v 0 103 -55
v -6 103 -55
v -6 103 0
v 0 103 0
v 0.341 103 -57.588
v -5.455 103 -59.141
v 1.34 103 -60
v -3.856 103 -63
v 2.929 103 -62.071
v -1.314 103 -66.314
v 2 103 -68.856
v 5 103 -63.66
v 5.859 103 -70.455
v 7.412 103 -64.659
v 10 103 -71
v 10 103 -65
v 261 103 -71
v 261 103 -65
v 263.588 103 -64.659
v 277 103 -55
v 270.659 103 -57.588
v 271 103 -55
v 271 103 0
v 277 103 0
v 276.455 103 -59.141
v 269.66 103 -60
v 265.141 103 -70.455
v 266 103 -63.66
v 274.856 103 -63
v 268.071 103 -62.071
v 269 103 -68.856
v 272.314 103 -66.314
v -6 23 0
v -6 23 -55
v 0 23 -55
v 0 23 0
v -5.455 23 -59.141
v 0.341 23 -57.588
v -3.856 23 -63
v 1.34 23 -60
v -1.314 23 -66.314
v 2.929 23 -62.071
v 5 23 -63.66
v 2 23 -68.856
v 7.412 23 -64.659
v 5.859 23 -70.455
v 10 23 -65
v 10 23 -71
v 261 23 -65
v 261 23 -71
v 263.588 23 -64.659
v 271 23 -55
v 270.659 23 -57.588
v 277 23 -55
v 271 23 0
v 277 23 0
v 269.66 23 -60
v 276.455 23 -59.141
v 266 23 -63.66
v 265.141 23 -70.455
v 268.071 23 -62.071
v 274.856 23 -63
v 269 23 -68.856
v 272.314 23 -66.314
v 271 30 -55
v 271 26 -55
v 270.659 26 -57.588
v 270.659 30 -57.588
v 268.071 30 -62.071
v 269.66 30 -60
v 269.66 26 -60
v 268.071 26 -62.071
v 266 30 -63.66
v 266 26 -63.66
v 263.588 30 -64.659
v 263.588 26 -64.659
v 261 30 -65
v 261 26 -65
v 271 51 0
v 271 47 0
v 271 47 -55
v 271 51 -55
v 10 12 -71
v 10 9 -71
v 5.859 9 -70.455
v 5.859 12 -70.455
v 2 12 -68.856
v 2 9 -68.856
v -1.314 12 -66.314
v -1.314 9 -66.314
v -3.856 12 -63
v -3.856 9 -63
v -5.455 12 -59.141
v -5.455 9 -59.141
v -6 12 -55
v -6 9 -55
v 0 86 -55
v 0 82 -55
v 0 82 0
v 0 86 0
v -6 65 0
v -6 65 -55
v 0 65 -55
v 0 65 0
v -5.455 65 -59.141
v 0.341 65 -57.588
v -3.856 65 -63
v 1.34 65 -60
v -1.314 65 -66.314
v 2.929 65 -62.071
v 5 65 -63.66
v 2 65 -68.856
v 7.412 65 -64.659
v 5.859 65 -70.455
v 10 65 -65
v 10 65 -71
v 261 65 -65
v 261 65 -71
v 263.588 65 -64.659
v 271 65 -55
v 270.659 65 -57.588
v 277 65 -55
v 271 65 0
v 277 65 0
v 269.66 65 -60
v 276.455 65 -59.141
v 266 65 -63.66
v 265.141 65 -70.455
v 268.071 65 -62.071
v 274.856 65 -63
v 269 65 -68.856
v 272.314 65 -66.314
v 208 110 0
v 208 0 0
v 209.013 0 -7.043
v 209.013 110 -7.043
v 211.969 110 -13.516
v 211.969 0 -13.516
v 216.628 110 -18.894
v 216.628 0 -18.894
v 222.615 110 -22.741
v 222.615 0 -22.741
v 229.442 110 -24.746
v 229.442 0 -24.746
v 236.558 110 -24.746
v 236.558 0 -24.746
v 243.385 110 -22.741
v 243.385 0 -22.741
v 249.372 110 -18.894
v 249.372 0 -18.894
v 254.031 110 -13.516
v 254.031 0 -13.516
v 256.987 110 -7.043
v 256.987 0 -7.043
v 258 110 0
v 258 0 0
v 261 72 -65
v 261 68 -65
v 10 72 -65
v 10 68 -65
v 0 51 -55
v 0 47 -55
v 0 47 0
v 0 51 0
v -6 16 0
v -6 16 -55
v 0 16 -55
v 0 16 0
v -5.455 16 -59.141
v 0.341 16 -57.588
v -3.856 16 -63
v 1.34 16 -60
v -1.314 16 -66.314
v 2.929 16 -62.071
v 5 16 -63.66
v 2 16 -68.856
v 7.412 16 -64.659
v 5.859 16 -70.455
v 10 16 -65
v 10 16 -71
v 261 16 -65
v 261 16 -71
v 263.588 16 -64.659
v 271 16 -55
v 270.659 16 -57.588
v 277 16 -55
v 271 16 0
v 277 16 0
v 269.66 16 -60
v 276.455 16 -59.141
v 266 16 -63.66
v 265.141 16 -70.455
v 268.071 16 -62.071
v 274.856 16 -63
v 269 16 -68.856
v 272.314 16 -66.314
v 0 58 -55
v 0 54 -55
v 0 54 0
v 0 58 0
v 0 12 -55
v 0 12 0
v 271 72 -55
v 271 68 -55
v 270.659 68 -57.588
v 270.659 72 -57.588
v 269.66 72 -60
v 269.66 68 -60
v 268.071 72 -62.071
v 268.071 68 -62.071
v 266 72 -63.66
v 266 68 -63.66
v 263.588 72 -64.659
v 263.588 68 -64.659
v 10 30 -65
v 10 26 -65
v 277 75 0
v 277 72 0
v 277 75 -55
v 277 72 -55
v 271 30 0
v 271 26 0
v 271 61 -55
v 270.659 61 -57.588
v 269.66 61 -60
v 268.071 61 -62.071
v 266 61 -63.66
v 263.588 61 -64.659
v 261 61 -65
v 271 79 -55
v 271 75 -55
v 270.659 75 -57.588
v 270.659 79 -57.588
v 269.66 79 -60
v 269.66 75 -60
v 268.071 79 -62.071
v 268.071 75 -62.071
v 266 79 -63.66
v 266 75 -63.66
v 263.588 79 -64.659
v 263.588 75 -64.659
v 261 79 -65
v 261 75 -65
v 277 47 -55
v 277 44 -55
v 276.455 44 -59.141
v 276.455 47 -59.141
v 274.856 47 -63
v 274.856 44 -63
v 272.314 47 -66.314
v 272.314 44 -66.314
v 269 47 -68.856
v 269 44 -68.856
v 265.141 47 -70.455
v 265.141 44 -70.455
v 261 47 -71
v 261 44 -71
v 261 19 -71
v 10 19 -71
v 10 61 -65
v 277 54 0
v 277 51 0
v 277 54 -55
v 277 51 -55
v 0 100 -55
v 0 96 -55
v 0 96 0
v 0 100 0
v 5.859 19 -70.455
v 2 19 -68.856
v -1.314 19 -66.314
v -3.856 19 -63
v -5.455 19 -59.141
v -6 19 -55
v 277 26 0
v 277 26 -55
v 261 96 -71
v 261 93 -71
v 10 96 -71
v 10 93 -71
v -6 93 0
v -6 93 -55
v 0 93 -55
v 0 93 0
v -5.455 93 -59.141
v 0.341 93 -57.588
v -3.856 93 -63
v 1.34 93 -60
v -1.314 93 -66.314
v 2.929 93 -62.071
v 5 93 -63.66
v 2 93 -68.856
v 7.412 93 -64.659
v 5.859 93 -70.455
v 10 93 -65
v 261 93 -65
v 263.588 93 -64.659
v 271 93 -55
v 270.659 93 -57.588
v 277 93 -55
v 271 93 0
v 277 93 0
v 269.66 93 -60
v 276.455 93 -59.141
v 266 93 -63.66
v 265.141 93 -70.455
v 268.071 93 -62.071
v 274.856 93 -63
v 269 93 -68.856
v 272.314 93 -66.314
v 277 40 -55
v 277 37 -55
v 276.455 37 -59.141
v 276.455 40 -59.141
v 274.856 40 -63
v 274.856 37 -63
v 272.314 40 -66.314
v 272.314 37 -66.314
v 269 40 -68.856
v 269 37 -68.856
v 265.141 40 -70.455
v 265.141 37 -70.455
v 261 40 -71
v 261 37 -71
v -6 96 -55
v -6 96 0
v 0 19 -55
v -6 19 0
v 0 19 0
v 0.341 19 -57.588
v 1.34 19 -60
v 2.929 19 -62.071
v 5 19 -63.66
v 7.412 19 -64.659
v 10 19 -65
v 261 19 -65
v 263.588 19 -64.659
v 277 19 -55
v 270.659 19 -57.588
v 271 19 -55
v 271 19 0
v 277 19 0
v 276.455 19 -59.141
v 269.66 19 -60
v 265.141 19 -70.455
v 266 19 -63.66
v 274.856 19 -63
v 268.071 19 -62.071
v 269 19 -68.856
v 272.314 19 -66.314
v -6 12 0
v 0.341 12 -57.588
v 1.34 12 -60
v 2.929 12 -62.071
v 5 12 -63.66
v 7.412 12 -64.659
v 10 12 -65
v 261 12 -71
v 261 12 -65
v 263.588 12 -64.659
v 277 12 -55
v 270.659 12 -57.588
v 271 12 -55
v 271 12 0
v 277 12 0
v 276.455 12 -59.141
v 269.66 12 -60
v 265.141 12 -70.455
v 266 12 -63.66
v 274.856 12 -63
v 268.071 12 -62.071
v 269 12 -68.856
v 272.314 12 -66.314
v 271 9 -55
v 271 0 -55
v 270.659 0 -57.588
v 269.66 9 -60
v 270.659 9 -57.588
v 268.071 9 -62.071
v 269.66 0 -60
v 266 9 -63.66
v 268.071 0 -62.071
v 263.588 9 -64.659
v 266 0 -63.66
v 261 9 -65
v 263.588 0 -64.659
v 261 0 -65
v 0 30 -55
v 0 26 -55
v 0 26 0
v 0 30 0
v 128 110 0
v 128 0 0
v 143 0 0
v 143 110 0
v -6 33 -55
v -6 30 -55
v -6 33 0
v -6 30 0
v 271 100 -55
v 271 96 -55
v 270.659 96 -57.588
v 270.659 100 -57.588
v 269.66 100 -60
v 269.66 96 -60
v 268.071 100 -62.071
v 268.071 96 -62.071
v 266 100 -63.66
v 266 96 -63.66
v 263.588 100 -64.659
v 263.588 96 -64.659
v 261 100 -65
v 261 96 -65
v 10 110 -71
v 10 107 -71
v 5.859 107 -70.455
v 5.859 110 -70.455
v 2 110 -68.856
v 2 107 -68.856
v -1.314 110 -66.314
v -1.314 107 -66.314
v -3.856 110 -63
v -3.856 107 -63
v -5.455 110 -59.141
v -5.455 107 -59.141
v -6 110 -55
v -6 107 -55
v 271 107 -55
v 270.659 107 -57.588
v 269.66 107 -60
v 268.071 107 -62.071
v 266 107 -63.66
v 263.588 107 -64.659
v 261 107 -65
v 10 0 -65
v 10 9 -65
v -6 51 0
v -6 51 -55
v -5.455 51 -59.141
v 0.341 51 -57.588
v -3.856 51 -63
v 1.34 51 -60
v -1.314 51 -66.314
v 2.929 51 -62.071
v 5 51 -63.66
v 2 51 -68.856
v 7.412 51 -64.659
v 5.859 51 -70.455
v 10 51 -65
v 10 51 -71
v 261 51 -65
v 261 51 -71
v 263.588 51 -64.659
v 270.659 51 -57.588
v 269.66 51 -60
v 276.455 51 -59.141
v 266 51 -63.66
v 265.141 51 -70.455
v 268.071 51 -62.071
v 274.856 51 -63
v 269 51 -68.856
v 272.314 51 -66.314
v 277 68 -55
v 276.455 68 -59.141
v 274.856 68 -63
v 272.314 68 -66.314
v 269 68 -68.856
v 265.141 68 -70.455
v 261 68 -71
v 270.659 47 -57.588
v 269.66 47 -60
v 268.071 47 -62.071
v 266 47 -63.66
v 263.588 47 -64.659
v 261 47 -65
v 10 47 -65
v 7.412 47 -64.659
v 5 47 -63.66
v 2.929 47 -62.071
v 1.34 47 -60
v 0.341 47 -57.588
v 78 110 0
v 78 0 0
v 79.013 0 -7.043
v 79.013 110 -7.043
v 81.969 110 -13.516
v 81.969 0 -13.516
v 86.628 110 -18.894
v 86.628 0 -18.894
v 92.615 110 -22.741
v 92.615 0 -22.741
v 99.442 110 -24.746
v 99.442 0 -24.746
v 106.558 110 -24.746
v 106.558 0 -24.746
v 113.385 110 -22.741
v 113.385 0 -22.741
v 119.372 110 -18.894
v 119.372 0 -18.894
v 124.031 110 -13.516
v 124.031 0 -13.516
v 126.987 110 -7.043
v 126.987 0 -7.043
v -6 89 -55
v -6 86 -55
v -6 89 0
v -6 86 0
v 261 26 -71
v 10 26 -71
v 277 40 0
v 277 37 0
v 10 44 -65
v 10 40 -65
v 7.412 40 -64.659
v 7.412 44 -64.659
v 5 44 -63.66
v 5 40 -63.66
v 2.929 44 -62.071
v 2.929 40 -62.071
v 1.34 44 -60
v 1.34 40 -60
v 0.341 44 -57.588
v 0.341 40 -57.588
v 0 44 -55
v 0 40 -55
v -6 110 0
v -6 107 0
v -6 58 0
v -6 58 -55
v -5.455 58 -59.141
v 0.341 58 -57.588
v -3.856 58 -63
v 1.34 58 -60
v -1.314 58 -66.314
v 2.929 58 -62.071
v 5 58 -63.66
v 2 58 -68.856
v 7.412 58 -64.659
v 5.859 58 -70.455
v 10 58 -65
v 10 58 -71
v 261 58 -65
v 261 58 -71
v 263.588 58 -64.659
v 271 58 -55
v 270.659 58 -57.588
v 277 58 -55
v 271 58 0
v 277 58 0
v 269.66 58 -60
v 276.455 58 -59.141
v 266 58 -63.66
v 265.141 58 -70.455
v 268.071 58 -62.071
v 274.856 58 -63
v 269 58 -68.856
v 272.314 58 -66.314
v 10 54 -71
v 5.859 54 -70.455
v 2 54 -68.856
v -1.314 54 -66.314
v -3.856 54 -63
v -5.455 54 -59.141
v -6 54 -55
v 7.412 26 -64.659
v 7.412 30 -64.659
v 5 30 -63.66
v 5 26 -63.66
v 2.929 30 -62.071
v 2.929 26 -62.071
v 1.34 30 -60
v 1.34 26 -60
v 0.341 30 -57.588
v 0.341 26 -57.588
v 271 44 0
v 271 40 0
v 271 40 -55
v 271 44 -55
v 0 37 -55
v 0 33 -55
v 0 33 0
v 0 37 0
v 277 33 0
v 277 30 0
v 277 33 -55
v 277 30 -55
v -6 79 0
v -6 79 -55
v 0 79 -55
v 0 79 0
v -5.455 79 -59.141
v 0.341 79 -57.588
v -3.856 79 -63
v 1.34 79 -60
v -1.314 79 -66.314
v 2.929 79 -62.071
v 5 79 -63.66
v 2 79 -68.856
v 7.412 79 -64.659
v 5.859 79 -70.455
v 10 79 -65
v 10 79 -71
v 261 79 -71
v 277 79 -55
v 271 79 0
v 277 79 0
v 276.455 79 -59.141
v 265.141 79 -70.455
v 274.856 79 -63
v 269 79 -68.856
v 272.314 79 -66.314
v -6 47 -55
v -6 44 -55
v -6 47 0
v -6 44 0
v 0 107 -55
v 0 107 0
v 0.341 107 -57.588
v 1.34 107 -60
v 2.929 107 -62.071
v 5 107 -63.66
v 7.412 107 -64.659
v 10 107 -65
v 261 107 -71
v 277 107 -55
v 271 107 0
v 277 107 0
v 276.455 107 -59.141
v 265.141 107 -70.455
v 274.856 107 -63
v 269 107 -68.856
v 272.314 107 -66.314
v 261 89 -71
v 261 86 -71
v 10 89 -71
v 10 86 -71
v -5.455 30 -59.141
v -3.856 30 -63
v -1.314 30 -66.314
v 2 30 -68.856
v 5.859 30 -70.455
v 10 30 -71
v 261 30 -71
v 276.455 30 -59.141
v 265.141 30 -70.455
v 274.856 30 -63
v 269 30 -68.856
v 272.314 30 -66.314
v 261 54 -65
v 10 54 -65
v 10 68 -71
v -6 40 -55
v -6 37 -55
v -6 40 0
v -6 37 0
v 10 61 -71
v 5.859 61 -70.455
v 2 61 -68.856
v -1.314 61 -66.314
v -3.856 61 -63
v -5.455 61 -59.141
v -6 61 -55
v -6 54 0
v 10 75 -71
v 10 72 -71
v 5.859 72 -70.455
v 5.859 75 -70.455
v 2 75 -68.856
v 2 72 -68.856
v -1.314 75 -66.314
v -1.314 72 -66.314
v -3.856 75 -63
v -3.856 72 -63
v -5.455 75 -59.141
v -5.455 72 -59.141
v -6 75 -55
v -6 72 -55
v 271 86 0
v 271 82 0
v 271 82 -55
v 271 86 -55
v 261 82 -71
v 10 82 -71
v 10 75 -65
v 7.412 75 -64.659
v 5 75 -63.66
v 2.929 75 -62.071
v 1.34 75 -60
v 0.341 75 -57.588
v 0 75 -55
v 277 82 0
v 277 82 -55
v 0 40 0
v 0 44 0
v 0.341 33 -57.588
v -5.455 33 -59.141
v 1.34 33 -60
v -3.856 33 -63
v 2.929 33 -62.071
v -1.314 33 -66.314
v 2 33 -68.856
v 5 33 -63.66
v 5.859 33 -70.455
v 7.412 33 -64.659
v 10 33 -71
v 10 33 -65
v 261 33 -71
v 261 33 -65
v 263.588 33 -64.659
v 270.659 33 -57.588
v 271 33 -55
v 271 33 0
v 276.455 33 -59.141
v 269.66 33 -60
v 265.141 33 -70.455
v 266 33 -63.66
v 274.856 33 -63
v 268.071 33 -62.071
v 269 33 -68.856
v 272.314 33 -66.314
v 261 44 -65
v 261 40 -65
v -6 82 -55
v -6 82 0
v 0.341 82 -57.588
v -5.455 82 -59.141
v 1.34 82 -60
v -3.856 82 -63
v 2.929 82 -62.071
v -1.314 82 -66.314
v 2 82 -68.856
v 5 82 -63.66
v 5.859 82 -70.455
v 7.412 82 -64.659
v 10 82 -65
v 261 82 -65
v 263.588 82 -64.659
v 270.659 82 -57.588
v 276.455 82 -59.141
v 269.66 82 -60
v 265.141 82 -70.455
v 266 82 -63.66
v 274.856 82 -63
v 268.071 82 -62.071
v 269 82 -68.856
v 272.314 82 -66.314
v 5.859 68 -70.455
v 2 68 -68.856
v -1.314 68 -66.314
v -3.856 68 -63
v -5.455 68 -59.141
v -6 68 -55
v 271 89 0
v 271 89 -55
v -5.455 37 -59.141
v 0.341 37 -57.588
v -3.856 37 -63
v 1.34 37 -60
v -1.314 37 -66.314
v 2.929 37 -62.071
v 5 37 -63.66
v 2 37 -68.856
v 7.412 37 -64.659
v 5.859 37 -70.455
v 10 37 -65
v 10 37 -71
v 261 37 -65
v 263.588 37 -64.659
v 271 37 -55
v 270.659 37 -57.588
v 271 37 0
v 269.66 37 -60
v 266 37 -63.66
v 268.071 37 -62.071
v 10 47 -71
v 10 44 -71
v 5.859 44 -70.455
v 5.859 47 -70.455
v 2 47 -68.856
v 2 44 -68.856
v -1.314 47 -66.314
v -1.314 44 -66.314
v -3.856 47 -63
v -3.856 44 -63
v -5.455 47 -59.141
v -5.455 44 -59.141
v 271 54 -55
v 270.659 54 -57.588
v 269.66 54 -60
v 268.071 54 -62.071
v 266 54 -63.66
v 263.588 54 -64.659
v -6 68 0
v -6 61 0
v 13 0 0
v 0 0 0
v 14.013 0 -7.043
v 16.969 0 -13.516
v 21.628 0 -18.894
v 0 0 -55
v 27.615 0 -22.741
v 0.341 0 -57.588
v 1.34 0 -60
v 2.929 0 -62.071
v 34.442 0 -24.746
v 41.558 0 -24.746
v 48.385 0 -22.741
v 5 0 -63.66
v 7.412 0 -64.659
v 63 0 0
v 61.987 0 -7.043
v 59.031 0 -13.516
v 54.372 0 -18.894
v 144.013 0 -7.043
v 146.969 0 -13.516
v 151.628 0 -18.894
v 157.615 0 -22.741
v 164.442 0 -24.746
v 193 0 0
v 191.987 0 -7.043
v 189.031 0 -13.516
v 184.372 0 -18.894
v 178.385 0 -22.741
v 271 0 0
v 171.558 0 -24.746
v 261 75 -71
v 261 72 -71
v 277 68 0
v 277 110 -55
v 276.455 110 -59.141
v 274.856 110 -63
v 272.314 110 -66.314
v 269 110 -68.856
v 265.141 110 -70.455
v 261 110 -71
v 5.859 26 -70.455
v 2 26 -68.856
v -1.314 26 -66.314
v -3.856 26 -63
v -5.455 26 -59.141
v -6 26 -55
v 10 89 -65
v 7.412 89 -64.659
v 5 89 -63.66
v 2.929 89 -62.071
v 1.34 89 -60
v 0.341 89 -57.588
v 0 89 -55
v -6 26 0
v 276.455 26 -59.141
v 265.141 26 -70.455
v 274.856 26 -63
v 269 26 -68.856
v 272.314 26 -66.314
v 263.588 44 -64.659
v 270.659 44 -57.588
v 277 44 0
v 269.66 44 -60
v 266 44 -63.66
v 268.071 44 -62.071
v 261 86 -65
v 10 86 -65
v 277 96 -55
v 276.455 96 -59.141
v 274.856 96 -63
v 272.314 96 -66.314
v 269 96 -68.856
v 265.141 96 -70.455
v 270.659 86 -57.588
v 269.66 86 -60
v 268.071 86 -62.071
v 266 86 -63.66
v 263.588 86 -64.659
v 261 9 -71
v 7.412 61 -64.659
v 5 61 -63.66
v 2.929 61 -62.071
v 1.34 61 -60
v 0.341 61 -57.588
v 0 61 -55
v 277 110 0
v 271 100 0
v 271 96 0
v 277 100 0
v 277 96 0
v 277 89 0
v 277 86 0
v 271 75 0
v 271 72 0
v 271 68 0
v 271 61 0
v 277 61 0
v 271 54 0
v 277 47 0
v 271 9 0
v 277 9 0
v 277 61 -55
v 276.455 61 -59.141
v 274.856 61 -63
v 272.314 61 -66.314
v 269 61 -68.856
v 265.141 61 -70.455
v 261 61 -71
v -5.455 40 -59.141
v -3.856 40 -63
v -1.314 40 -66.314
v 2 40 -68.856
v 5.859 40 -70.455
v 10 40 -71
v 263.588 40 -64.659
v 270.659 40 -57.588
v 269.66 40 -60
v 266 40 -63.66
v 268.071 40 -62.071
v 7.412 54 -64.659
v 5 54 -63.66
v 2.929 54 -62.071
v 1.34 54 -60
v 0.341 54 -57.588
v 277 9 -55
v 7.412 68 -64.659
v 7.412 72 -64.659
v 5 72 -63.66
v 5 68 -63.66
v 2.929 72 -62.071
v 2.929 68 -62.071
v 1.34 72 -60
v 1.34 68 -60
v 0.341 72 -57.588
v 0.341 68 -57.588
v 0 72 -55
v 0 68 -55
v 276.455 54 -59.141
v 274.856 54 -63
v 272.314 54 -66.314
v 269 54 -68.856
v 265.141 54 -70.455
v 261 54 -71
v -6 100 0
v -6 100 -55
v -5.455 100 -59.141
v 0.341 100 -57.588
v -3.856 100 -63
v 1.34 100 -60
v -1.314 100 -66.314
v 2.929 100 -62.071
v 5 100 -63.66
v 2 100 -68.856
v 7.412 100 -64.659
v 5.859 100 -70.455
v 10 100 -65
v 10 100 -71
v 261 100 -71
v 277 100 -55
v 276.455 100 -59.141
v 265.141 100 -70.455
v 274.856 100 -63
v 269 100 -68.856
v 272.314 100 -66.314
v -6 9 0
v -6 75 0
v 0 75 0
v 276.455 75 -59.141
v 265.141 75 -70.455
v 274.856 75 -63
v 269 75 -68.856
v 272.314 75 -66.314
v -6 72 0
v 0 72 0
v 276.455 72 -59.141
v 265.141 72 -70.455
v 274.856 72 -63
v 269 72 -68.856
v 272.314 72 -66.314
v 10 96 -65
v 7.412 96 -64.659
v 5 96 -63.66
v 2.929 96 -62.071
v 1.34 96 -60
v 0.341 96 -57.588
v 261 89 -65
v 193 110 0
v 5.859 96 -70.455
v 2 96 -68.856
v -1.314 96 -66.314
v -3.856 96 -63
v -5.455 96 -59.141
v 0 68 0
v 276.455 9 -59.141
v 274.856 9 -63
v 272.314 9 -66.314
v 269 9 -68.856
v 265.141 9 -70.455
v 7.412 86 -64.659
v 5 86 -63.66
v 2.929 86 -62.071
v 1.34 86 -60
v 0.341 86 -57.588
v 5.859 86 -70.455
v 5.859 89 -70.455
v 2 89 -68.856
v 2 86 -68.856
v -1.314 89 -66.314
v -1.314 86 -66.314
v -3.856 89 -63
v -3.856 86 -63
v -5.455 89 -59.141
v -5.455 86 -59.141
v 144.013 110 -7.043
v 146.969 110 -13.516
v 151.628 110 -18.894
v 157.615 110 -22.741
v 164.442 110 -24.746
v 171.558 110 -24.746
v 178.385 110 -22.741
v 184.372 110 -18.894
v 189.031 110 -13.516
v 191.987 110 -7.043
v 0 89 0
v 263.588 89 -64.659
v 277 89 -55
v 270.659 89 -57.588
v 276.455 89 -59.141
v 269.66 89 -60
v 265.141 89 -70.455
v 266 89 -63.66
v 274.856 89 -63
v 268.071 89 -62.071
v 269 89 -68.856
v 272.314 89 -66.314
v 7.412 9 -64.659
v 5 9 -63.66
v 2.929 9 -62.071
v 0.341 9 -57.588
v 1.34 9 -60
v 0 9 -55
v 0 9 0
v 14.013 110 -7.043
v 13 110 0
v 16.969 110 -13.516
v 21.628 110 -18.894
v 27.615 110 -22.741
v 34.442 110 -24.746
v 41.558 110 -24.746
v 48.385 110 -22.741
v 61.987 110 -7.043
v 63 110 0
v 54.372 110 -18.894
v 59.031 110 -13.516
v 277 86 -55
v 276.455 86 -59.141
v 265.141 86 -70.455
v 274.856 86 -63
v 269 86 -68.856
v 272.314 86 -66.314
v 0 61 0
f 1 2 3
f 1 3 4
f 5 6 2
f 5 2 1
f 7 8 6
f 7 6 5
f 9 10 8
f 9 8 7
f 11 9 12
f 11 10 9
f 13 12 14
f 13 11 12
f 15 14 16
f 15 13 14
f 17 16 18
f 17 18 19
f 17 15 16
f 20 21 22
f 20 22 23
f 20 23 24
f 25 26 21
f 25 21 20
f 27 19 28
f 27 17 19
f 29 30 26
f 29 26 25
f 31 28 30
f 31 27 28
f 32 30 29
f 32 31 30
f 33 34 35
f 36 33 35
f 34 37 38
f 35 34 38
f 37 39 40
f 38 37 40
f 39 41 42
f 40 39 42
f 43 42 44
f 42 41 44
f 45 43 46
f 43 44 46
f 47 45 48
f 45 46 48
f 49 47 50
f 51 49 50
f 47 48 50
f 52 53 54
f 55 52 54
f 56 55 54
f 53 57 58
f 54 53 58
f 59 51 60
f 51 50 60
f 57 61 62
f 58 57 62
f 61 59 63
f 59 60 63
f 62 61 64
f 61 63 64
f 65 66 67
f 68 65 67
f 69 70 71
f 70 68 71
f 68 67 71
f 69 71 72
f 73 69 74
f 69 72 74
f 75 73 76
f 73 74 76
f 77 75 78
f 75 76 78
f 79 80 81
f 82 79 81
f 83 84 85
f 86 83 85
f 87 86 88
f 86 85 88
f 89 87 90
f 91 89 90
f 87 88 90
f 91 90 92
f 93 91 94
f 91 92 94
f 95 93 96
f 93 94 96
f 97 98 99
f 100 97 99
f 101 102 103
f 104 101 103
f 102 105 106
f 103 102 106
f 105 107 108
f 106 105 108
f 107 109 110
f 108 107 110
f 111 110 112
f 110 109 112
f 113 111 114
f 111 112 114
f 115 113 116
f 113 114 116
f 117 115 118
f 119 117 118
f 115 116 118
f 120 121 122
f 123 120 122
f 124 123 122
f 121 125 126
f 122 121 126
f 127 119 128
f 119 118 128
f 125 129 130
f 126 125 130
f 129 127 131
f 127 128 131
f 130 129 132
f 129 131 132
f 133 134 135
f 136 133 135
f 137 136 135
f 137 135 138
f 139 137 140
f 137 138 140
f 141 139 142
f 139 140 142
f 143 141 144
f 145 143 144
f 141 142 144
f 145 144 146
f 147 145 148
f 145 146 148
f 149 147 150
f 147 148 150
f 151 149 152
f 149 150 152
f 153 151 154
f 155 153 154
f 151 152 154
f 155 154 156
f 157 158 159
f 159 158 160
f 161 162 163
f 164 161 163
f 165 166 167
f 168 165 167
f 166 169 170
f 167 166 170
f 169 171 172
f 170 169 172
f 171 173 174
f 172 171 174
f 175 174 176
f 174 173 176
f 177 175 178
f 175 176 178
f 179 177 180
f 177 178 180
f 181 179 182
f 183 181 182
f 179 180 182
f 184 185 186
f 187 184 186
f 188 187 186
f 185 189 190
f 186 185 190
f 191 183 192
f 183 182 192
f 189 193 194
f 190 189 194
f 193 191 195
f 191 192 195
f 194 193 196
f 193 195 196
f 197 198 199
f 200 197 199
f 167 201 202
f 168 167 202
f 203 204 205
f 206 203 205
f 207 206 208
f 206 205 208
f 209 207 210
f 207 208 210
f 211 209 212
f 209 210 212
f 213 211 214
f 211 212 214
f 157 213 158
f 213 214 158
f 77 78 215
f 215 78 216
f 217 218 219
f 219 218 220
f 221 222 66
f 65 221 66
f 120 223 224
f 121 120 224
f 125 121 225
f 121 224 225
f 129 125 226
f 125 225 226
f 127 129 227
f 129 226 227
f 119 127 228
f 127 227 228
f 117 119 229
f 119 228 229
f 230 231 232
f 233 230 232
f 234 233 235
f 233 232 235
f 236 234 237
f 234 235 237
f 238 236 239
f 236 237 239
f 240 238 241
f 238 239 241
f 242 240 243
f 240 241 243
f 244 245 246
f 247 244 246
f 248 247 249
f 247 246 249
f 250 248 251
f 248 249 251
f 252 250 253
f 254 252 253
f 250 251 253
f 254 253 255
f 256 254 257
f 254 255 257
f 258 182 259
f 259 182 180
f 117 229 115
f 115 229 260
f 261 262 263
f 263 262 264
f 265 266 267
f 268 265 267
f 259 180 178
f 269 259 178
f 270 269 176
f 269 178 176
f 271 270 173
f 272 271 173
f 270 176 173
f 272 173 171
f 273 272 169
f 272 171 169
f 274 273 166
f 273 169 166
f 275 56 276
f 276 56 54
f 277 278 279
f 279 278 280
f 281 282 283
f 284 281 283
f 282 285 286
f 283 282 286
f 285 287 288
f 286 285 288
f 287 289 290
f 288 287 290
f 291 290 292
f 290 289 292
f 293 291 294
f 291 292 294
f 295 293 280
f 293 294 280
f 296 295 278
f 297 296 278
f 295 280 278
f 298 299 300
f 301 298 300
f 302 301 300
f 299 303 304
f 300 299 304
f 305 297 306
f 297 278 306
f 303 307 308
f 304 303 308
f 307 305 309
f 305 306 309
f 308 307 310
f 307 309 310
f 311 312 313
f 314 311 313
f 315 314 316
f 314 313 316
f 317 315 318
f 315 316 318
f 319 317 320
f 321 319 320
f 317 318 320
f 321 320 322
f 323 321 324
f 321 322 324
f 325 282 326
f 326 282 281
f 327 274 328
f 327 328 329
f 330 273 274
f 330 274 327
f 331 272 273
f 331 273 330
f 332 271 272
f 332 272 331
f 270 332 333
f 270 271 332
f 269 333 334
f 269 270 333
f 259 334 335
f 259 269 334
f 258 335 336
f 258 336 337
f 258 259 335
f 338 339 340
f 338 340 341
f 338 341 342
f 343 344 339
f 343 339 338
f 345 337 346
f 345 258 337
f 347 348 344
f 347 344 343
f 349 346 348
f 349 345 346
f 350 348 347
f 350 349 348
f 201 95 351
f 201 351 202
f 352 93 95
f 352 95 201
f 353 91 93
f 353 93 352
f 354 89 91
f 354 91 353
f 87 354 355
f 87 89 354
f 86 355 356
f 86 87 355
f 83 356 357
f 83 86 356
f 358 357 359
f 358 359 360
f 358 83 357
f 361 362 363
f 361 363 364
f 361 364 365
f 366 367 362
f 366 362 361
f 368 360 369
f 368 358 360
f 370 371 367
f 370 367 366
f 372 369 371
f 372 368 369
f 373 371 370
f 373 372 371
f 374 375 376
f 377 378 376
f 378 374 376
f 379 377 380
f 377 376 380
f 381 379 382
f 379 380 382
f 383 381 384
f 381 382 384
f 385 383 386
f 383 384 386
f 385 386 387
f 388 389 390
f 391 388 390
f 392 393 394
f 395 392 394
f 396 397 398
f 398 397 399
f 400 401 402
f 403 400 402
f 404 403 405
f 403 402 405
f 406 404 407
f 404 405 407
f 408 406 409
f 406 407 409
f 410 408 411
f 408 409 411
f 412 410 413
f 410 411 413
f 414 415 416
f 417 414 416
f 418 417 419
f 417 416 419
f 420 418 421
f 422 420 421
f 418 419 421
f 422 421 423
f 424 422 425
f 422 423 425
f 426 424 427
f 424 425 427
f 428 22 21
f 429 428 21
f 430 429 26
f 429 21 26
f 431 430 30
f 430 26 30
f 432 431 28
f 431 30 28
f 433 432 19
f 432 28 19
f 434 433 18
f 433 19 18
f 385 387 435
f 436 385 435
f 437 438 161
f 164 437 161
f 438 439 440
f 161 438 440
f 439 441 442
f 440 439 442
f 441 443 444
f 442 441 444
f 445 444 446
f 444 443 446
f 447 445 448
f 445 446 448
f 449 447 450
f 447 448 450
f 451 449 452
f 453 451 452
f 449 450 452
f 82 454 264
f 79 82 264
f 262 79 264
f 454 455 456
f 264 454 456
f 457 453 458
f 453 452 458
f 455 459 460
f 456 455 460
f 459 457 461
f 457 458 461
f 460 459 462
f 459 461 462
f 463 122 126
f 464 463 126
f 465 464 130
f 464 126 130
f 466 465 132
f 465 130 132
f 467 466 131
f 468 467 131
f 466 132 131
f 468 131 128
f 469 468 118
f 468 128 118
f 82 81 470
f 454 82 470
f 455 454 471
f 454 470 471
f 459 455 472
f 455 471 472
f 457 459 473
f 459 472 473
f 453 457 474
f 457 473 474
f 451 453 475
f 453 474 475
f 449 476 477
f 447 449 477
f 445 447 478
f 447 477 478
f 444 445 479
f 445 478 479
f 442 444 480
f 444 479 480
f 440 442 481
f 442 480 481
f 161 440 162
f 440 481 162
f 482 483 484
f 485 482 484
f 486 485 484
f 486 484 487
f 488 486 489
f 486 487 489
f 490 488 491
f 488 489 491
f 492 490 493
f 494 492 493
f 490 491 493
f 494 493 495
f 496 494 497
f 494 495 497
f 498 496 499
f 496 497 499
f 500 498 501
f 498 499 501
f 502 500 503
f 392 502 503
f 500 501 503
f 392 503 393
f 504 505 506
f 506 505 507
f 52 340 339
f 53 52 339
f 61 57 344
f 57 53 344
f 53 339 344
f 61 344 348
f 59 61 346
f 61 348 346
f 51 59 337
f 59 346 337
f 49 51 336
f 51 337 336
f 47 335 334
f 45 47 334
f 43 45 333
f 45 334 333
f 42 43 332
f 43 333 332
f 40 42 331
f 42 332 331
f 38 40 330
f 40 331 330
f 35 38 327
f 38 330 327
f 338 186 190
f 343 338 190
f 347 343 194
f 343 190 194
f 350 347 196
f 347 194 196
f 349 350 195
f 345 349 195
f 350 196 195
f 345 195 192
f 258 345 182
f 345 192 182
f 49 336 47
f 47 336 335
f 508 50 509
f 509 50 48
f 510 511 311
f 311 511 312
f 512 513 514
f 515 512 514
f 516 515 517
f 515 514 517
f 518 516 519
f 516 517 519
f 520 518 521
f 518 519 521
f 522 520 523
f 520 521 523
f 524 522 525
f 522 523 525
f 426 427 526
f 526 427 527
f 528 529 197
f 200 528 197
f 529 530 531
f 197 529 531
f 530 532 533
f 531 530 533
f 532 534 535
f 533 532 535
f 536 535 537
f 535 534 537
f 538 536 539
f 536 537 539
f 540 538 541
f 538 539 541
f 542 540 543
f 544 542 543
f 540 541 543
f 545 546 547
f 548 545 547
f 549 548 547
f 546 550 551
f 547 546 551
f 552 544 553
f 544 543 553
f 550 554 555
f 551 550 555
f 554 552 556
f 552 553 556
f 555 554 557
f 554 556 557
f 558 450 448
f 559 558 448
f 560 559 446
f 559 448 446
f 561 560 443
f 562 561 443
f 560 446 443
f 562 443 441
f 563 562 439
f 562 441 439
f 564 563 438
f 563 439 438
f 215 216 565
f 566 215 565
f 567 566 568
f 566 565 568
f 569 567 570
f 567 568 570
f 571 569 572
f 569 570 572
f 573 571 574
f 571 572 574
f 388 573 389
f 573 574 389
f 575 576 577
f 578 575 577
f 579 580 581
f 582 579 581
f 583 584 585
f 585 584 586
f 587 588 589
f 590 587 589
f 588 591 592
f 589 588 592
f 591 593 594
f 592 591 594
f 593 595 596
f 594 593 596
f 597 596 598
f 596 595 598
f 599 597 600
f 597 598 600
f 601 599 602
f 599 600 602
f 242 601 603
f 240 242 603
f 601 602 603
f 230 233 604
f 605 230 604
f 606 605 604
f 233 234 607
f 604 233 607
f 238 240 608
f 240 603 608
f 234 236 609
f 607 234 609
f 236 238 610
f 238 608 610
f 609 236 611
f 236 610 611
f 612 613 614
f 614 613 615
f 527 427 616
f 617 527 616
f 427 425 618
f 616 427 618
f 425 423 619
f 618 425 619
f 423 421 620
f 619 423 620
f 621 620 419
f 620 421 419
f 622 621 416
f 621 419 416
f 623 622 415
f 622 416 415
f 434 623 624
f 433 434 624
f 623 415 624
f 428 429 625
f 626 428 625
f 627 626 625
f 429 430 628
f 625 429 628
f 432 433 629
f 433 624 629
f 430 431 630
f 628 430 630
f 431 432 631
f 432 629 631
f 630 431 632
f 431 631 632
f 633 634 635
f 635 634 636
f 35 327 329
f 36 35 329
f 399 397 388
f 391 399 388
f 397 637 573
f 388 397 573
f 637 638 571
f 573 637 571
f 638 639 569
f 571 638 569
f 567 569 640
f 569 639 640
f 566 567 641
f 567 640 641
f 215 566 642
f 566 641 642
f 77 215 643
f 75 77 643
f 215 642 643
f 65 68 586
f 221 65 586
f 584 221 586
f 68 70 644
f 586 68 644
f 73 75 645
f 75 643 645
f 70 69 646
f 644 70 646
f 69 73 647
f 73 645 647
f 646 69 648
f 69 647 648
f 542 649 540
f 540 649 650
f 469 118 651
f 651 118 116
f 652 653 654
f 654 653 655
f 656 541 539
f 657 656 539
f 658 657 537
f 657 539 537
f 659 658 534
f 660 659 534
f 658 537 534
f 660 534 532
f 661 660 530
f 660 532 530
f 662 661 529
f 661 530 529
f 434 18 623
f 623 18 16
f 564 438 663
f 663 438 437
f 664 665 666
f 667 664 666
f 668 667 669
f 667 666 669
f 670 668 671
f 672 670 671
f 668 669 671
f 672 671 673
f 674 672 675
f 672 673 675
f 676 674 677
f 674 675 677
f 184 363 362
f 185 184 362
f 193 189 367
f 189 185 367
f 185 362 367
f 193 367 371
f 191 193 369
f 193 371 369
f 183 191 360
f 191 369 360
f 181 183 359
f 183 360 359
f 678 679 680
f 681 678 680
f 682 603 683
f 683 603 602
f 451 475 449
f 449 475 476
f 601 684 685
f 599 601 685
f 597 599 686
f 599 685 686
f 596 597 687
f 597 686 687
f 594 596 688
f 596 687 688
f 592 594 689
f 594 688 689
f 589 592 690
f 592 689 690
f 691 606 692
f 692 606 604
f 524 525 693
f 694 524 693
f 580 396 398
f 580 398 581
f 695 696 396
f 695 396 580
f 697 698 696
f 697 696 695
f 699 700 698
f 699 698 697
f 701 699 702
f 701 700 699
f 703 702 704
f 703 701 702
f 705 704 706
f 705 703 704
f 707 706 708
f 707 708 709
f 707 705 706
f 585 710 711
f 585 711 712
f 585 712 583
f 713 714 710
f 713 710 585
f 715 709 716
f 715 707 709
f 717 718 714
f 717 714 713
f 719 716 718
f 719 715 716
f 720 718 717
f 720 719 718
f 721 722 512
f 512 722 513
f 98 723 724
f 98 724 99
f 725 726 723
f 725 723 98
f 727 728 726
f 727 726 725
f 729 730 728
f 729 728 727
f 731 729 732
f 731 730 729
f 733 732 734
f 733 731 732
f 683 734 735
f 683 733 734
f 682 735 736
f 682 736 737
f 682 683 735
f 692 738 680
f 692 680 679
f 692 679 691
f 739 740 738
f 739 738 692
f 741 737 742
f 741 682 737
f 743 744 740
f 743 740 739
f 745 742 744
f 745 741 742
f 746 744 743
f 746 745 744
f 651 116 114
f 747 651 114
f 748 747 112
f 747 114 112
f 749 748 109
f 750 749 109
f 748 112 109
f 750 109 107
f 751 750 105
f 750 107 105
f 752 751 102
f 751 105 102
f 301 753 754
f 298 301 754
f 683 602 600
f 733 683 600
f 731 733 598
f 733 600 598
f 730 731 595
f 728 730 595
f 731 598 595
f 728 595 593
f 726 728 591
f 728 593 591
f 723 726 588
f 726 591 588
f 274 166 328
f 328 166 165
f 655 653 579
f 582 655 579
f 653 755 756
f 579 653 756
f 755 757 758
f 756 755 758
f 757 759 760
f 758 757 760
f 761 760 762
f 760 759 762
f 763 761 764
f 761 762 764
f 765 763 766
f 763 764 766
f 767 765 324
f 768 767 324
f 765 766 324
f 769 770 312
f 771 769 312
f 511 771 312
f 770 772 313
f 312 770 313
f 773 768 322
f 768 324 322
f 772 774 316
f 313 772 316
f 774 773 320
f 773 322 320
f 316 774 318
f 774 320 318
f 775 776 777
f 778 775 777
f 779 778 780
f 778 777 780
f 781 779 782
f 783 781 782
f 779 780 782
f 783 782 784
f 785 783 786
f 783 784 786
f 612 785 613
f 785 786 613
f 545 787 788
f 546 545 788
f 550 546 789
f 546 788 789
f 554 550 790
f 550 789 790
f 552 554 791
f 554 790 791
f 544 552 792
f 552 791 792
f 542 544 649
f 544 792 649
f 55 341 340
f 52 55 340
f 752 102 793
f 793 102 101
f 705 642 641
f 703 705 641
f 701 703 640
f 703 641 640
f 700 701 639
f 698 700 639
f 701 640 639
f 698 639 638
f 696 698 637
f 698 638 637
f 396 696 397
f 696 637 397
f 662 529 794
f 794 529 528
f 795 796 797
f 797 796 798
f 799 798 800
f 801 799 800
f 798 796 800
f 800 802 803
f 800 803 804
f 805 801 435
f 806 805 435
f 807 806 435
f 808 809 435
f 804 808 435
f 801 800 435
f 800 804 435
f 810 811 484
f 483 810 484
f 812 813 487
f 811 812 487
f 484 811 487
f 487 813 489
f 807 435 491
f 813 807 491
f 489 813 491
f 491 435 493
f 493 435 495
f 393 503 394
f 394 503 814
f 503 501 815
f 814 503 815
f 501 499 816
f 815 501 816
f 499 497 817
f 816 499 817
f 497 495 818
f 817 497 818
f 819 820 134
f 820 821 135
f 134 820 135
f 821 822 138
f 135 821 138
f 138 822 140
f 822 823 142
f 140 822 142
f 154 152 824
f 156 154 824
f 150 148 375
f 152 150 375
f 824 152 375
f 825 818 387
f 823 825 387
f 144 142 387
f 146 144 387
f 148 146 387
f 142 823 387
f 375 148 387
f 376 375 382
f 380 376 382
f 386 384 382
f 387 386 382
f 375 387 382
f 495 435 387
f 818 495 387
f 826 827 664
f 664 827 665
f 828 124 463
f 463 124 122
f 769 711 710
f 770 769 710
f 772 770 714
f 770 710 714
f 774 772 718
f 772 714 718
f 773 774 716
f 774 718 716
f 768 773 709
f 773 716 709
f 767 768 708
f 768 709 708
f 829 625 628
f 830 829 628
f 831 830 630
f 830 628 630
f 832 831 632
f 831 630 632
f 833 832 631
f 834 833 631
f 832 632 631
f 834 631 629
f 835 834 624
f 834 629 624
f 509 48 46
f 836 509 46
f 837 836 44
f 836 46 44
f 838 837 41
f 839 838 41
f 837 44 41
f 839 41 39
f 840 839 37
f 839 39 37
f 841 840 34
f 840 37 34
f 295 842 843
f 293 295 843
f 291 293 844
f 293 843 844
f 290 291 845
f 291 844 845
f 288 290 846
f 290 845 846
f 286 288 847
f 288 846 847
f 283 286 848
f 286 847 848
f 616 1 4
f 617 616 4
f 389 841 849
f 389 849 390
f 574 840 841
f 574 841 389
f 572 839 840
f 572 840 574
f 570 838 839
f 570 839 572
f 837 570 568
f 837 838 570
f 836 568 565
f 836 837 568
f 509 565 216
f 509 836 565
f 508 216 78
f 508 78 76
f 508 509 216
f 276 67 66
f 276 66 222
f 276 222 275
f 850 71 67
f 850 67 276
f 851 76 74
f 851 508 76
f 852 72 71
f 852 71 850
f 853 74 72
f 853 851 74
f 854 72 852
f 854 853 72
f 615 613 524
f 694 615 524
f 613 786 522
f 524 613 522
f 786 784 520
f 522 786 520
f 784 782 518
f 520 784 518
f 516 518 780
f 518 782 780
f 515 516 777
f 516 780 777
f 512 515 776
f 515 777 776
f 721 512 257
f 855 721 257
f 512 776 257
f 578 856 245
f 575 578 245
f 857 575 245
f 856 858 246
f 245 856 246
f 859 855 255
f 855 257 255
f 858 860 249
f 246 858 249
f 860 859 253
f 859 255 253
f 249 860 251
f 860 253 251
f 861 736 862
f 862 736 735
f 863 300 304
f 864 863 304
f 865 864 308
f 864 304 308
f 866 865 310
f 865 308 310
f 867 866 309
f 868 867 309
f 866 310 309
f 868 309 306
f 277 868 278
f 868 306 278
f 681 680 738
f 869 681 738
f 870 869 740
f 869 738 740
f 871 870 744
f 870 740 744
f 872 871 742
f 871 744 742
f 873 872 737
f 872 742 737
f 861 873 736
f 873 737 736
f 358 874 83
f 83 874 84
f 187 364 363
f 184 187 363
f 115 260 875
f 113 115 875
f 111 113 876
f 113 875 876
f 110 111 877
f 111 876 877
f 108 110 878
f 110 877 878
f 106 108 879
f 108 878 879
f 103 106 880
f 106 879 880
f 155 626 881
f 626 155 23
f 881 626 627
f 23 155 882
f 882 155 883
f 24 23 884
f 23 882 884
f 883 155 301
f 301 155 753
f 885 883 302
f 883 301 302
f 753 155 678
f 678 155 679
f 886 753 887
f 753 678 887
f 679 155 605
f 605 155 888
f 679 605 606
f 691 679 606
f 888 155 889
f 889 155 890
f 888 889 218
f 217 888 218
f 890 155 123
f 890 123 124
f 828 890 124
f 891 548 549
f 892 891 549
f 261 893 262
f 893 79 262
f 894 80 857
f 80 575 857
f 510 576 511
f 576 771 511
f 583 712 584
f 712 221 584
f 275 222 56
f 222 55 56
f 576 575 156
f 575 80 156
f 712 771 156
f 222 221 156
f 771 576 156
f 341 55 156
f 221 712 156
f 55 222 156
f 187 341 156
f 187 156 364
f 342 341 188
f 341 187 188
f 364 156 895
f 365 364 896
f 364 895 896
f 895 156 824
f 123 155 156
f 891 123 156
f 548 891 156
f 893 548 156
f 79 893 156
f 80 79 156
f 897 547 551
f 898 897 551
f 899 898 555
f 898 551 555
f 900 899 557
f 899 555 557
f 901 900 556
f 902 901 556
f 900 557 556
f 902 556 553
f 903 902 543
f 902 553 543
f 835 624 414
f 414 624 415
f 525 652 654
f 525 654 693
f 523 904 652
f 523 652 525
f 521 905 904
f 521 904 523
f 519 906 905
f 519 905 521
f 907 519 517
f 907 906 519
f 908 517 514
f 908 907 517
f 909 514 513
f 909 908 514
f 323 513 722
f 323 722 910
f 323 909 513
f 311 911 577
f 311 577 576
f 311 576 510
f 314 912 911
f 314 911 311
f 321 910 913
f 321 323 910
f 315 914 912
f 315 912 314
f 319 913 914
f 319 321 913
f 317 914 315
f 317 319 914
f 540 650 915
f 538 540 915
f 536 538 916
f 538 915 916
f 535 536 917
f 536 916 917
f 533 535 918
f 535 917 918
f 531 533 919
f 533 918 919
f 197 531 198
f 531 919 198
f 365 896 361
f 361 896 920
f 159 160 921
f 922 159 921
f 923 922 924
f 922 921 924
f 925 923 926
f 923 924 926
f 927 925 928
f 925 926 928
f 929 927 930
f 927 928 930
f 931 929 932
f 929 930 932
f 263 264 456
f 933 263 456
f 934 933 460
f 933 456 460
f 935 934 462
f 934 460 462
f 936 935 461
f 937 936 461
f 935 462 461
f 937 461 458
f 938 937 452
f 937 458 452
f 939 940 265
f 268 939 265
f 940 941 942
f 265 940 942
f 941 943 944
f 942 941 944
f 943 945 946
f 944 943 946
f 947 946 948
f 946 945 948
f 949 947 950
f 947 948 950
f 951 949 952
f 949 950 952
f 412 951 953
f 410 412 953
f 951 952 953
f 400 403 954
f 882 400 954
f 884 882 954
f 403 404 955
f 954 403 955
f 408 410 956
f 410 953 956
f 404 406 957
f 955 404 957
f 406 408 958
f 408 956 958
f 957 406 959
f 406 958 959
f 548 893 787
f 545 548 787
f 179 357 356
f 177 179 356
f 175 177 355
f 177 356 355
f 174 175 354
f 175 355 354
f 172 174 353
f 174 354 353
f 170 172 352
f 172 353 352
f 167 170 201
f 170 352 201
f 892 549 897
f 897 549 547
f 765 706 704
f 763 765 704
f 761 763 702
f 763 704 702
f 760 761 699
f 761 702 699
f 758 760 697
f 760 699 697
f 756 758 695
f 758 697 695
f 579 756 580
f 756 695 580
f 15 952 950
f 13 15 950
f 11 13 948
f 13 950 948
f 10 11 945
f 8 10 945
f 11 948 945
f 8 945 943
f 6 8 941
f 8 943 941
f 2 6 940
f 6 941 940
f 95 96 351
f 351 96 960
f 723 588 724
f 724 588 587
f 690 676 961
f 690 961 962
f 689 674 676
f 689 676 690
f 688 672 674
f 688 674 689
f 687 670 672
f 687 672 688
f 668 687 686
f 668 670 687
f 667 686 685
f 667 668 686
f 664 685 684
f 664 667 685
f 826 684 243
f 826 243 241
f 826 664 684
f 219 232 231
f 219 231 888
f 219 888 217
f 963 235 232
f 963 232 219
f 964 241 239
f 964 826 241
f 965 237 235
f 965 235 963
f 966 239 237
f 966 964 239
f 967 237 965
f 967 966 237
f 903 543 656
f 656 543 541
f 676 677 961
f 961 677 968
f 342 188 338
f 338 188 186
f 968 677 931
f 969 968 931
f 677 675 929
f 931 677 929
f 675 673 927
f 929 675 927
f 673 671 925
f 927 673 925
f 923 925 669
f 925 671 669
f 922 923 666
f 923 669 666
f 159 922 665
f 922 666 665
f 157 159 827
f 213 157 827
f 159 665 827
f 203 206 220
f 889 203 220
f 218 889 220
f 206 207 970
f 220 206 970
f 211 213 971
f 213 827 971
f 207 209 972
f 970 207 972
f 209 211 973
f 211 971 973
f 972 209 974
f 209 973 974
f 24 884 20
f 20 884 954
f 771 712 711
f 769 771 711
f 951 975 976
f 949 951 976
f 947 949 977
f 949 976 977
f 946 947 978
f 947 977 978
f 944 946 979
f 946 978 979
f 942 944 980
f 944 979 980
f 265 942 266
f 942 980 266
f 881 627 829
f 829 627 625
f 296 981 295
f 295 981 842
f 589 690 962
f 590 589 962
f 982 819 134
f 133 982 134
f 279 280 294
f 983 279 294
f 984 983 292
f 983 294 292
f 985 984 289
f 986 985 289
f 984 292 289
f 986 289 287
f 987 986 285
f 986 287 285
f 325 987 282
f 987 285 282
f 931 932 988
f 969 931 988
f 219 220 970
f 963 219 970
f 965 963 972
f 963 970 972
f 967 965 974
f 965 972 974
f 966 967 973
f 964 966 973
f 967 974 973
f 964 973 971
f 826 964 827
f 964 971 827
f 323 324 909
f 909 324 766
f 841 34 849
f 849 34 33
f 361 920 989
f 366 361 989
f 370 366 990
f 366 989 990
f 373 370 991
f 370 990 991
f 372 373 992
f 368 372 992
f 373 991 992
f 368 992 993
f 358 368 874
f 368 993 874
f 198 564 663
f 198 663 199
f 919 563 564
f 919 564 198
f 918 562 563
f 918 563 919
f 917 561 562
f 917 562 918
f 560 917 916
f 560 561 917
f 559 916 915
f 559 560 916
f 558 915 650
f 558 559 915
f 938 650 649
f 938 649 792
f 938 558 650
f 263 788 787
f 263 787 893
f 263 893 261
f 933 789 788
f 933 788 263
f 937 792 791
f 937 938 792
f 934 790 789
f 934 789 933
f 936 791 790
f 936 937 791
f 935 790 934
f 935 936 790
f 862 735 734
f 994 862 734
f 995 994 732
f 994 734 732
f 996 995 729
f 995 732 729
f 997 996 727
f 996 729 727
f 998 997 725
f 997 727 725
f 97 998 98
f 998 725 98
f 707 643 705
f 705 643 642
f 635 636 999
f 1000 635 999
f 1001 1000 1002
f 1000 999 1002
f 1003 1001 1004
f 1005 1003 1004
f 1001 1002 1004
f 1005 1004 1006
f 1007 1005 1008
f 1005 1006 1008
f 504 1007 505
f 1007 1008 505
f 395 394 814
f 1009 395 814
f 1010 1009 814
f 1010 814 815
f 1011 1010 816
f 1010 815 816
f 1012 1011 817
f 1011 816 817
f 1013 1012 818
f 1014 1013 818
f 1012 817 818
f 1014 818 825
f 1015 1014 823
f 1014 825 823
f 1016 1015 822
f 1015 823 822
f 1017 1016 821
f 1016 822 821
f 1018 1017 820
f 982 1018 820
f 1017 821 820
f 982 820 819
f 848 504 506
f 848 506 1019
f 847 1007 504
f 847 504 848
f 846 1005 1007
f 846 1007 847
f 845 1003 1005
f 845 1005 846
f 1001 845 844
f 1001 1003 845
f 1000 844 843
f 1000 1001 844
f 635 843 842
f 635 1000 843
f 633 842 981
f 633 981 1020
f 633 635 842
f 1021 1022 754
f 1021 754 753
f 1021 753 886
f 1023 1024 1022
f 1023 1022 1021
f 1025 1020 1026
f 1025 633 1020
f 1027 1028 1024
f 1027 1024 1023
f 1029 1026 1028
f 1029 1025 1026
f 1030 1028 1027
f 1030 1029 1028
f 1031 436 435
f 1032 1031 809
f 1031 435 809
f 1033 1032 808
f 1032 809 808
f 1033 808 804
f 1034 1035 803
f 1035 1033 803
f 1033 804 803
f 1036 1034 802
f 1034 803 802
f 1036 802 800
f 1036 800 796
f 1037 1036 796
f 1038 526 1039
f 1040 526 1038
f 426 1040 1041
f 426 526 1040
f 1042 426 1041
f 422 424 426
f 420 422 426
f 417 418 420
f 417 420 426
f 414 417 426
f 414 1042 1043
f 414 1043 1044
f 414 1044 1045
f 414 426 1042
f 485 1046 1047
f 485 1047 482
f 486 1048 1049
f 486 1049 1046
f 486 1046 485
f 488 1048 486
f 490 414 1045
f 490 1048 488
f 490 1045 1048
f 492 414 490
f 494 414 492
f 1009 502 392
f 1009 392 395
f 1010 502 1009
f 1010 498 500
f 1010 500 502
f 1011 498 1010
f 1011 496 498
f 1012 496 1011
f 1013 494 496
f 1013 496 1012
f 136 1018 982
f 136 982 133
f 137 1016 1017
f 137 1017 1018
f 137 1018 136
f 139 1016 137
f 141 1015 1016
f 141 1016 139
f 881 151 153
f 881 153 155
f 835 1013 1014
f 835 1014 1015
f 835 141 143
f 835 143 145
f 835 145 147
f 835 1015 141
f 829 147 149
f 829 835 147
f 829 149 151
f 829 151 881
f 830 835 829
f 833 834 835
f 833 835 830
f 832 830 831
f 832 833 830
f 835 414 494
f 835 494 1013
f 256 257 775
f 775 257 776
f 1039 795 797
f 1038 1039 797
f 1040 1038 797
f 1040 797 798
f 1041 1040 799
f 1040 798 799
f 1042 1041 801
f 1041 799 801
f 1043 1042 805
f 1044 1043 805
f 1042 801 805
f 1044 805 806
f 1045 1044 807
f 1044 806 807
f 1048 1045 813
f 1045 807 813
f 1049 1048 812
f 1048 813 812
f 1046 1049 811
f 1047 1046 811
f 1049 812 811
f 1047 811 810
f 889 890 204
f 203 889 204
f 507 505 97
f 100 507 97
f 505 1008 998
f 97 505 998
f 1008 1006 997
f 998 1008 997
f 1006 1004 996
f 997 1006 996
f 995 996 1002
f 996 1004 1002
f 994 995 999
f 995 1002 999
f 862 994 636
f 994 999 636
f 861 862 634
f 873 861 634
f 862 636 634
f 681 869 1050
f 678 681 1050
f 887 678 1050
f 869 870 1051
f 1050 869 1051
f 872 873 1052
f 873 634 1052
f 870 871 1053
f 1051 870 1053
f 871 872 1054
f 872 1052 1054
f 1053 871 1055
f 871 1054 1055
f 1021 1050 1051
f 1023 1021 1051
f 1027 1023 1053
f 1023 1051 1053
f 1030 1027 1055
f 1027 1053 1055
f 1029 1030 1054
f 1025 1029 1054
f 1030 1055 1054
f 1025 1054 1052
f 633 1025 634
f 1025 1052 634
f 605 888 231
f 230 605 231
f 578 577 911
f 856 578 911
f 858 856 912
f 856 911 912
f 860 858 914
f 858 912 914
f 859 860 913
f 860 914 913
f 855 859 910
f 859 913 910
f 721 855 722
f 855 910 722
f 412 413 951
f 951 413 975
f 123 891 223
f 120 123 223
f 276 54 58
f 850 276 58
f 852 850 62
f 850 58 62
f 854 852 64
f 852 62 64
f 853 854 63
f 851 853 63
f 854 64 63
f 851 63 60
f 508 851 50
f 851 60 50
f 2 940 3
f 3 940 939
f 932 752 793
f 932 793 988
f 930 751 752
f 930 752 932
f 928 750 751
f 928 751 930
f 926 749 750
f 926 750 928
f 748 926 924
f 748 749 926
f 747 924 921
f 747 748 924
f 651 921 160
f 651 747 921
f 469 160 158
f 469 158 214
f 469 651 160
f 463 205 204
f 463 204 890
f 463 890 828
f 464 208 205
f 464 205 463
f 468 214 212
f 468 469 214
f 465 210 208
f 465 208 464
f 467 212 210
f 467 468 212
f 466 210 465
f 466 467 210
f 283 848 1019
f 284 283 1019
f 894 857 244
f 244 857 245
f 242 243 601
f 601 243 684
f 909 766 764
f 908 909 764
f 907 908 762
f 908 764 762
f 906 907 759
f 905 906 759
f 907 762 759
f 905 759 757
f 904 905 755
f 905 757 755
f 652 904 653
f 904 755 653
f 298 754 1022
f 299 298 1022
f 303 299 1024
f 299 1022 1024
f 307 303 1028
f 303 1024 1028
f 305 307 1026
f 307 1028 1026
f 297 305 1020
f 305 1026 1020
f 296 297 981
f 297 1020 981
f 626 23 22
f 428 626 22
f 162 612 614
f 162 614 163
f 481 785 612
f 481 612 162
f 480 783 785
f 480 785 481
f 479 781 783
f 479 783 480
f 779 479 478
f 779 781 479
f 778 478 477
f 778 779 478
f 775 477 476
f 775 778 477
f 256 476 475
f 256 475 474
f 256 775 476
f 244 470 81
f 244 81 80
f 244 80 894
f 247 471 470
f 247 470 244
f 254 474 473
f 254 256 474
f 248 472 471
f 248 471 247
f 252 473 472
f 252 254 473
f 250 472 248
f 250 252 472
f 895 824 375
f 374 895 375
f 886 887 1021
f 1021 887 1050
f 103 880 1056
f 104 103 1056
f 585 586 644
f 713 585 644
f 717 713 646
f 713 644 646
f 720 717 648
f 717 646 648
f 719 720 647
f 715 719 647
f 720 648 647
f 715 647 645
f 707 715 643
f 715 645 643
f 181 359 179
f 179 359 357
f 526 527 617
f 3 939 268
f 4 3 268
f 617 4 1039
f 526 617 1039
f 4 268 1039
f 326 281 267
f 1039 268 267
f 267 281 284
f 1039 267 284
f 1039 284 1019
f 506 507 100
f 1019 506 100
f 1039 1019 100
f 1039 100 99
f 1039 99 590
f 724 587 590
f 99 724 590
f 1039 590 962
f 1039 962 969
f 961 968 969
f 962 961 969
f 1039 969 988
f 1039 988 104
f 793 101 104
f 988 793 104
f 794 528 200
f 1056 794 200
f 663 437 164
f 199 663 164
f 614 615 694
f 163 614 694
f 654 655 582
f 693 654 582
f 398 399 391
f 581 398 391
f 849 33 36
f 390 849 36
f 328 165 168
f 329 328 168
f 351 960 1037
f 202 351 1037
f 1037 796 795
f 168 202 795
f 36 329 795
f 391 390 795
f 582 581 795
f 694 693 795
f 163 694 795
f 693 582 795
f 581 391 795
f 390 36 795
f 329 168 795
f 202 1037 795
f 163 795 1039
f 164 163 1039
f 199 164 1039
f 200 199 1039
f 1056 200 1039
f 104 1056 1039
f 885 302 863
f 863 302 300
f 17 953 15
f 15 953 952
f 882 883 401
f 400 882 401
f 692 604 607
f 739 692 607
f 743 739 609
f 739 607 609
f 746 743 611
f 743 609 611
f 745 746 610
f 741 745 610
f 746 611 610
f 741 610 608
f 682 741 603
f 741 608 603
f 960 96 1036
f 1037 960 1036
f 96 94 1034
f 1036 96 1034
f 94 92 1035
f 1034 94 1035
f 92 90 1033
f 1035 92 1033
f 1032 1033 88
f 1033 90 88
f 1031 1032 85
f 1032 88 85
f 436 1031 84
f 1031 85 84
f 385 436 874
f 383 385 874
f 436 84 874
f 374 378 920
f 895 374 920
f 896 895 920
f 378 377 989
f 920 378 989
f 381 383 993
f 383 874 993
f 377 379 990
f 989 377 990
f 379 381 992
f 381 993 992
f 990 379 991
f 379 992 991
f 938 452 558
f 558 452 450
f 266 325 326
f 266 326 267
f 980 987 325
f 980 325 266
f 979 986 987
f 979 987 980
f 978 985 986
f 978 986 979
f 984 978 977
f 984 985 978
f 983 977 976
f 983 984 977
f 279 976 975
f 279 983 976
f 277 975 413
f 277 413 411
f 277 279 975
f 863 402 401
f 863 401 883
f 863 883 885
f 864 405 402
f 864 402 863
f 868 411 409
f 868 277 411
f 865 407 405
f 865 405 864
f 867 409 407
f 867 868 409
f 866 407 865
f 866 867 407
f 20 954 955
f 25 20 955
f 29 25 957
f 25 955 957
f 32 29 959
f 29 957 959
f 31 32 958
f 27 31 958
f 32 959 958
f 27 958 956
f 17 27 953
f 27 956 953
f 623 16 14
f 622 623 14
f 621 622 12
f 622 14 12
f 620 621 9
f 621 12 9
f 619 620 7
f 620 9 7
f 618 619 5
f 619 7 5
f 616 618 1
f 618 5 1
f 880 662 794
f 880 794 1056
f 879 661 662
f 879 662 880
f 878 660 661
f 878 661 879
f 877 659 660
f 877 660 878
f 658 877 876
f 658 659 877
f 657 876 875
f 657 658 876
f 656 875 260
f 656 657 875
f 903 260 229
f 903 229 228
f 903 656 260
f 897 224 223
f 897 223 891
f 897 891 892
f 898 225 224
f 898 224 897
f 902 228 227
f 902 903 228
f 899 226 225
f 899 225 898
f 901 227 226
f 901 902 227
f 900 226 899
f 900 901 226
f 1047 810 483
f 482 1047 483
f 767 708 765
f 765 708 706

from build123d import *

# Parameters (mm, degrees)
BOSS_EXTRUDE1_DEPTH = 110
BOSS_EXTRUDE2_START = -3
BOSS_EXTRUDE2_DEPTH = 3
LPATTERN1_COUNT     = 15
LPATTERN1_PITCH     = 7


with BuildPart() as part:
    # Sketch1 → Boss-Extrude1 (new body)
    with BuildSketch(Plane(origin=(0, 0, 0), x_dir=(1, 0, 0), z_dir=(0, 1, 0))):
        with BuildLine():
            Line((0, 0), (13, 0))
            ThreePointArc((13, 0), (38, 25), (63, 0))
            Line((63, 0), (78, 0))
            ThreePointArc((78, 0), (103, 25), (128, 0))
            Line((128, 0), (143, 0))
            ThreePointArc((143, 0), (168, 25), (193, 0))
            Line((193, 0), (208, 0))
            ThreePointArc((208, 0), (233, 25), (258, 0))
            Line((258, 0), (271, 0))
            Line((271, 0), (271, 55))
            ThreePointArc((271, 55), (268.071067812, 62.071067812), (261, 65))
            Line((261, 65), (10, 65))
            ThreePointArc((10, 65), (2.928932188, 62.071067812), (0, 55))
            Line((0, 55), (0, 0))
        make_face()
    extrude(amount=BOSS_EXTRUDE1_DEPTH)

    # Sketch3 → Boss-Extrude2 (add)
    with BuildSketch(Plane(origin=(0, 110, 0), x_dir=(1, 0, 0), z_dir=(0, 1, 0)).offset(BOSS_EXTRUDE2_START)):
        with BuildLine():
            Line((277, 0), (277, 55))
            ThreePointArc((277, 55), (272.313708499, 66.313708499), (261, 71))
            Line((261, 71), (10, 71))
            ThreePointArc((10, 71), (-1.313708499, 66.313708499), (-6, 55))
            Line((-6, 55), (-6, 0))
            Line((-6, 0), (0, 0))
            Line((0, 0), (0, 55))
            ThreePointArc((0, 55), (2.928932188, 62.071067812), (10, 65))
            Line((10, 65), (261, 65))
            ThreePointArc((261, 65), (268.071067812, 62.071067812), (271, 55))
            Line((271, 55), (271, 0))
            Line((271, 0), (277, 0))
        make_face()
    boss_extrude2 = extrude(amount=BOSS_EXTRUDE2_DEPTH)

    # LPattern1: Boss-Extrude2 ×15
    with Locations(*[(0, -i * LPATTERN1_PITCH, 0) for i in range(1, LPATTERN1_COUNT)]):
        add(boss_extrude2)


solid = part.part
